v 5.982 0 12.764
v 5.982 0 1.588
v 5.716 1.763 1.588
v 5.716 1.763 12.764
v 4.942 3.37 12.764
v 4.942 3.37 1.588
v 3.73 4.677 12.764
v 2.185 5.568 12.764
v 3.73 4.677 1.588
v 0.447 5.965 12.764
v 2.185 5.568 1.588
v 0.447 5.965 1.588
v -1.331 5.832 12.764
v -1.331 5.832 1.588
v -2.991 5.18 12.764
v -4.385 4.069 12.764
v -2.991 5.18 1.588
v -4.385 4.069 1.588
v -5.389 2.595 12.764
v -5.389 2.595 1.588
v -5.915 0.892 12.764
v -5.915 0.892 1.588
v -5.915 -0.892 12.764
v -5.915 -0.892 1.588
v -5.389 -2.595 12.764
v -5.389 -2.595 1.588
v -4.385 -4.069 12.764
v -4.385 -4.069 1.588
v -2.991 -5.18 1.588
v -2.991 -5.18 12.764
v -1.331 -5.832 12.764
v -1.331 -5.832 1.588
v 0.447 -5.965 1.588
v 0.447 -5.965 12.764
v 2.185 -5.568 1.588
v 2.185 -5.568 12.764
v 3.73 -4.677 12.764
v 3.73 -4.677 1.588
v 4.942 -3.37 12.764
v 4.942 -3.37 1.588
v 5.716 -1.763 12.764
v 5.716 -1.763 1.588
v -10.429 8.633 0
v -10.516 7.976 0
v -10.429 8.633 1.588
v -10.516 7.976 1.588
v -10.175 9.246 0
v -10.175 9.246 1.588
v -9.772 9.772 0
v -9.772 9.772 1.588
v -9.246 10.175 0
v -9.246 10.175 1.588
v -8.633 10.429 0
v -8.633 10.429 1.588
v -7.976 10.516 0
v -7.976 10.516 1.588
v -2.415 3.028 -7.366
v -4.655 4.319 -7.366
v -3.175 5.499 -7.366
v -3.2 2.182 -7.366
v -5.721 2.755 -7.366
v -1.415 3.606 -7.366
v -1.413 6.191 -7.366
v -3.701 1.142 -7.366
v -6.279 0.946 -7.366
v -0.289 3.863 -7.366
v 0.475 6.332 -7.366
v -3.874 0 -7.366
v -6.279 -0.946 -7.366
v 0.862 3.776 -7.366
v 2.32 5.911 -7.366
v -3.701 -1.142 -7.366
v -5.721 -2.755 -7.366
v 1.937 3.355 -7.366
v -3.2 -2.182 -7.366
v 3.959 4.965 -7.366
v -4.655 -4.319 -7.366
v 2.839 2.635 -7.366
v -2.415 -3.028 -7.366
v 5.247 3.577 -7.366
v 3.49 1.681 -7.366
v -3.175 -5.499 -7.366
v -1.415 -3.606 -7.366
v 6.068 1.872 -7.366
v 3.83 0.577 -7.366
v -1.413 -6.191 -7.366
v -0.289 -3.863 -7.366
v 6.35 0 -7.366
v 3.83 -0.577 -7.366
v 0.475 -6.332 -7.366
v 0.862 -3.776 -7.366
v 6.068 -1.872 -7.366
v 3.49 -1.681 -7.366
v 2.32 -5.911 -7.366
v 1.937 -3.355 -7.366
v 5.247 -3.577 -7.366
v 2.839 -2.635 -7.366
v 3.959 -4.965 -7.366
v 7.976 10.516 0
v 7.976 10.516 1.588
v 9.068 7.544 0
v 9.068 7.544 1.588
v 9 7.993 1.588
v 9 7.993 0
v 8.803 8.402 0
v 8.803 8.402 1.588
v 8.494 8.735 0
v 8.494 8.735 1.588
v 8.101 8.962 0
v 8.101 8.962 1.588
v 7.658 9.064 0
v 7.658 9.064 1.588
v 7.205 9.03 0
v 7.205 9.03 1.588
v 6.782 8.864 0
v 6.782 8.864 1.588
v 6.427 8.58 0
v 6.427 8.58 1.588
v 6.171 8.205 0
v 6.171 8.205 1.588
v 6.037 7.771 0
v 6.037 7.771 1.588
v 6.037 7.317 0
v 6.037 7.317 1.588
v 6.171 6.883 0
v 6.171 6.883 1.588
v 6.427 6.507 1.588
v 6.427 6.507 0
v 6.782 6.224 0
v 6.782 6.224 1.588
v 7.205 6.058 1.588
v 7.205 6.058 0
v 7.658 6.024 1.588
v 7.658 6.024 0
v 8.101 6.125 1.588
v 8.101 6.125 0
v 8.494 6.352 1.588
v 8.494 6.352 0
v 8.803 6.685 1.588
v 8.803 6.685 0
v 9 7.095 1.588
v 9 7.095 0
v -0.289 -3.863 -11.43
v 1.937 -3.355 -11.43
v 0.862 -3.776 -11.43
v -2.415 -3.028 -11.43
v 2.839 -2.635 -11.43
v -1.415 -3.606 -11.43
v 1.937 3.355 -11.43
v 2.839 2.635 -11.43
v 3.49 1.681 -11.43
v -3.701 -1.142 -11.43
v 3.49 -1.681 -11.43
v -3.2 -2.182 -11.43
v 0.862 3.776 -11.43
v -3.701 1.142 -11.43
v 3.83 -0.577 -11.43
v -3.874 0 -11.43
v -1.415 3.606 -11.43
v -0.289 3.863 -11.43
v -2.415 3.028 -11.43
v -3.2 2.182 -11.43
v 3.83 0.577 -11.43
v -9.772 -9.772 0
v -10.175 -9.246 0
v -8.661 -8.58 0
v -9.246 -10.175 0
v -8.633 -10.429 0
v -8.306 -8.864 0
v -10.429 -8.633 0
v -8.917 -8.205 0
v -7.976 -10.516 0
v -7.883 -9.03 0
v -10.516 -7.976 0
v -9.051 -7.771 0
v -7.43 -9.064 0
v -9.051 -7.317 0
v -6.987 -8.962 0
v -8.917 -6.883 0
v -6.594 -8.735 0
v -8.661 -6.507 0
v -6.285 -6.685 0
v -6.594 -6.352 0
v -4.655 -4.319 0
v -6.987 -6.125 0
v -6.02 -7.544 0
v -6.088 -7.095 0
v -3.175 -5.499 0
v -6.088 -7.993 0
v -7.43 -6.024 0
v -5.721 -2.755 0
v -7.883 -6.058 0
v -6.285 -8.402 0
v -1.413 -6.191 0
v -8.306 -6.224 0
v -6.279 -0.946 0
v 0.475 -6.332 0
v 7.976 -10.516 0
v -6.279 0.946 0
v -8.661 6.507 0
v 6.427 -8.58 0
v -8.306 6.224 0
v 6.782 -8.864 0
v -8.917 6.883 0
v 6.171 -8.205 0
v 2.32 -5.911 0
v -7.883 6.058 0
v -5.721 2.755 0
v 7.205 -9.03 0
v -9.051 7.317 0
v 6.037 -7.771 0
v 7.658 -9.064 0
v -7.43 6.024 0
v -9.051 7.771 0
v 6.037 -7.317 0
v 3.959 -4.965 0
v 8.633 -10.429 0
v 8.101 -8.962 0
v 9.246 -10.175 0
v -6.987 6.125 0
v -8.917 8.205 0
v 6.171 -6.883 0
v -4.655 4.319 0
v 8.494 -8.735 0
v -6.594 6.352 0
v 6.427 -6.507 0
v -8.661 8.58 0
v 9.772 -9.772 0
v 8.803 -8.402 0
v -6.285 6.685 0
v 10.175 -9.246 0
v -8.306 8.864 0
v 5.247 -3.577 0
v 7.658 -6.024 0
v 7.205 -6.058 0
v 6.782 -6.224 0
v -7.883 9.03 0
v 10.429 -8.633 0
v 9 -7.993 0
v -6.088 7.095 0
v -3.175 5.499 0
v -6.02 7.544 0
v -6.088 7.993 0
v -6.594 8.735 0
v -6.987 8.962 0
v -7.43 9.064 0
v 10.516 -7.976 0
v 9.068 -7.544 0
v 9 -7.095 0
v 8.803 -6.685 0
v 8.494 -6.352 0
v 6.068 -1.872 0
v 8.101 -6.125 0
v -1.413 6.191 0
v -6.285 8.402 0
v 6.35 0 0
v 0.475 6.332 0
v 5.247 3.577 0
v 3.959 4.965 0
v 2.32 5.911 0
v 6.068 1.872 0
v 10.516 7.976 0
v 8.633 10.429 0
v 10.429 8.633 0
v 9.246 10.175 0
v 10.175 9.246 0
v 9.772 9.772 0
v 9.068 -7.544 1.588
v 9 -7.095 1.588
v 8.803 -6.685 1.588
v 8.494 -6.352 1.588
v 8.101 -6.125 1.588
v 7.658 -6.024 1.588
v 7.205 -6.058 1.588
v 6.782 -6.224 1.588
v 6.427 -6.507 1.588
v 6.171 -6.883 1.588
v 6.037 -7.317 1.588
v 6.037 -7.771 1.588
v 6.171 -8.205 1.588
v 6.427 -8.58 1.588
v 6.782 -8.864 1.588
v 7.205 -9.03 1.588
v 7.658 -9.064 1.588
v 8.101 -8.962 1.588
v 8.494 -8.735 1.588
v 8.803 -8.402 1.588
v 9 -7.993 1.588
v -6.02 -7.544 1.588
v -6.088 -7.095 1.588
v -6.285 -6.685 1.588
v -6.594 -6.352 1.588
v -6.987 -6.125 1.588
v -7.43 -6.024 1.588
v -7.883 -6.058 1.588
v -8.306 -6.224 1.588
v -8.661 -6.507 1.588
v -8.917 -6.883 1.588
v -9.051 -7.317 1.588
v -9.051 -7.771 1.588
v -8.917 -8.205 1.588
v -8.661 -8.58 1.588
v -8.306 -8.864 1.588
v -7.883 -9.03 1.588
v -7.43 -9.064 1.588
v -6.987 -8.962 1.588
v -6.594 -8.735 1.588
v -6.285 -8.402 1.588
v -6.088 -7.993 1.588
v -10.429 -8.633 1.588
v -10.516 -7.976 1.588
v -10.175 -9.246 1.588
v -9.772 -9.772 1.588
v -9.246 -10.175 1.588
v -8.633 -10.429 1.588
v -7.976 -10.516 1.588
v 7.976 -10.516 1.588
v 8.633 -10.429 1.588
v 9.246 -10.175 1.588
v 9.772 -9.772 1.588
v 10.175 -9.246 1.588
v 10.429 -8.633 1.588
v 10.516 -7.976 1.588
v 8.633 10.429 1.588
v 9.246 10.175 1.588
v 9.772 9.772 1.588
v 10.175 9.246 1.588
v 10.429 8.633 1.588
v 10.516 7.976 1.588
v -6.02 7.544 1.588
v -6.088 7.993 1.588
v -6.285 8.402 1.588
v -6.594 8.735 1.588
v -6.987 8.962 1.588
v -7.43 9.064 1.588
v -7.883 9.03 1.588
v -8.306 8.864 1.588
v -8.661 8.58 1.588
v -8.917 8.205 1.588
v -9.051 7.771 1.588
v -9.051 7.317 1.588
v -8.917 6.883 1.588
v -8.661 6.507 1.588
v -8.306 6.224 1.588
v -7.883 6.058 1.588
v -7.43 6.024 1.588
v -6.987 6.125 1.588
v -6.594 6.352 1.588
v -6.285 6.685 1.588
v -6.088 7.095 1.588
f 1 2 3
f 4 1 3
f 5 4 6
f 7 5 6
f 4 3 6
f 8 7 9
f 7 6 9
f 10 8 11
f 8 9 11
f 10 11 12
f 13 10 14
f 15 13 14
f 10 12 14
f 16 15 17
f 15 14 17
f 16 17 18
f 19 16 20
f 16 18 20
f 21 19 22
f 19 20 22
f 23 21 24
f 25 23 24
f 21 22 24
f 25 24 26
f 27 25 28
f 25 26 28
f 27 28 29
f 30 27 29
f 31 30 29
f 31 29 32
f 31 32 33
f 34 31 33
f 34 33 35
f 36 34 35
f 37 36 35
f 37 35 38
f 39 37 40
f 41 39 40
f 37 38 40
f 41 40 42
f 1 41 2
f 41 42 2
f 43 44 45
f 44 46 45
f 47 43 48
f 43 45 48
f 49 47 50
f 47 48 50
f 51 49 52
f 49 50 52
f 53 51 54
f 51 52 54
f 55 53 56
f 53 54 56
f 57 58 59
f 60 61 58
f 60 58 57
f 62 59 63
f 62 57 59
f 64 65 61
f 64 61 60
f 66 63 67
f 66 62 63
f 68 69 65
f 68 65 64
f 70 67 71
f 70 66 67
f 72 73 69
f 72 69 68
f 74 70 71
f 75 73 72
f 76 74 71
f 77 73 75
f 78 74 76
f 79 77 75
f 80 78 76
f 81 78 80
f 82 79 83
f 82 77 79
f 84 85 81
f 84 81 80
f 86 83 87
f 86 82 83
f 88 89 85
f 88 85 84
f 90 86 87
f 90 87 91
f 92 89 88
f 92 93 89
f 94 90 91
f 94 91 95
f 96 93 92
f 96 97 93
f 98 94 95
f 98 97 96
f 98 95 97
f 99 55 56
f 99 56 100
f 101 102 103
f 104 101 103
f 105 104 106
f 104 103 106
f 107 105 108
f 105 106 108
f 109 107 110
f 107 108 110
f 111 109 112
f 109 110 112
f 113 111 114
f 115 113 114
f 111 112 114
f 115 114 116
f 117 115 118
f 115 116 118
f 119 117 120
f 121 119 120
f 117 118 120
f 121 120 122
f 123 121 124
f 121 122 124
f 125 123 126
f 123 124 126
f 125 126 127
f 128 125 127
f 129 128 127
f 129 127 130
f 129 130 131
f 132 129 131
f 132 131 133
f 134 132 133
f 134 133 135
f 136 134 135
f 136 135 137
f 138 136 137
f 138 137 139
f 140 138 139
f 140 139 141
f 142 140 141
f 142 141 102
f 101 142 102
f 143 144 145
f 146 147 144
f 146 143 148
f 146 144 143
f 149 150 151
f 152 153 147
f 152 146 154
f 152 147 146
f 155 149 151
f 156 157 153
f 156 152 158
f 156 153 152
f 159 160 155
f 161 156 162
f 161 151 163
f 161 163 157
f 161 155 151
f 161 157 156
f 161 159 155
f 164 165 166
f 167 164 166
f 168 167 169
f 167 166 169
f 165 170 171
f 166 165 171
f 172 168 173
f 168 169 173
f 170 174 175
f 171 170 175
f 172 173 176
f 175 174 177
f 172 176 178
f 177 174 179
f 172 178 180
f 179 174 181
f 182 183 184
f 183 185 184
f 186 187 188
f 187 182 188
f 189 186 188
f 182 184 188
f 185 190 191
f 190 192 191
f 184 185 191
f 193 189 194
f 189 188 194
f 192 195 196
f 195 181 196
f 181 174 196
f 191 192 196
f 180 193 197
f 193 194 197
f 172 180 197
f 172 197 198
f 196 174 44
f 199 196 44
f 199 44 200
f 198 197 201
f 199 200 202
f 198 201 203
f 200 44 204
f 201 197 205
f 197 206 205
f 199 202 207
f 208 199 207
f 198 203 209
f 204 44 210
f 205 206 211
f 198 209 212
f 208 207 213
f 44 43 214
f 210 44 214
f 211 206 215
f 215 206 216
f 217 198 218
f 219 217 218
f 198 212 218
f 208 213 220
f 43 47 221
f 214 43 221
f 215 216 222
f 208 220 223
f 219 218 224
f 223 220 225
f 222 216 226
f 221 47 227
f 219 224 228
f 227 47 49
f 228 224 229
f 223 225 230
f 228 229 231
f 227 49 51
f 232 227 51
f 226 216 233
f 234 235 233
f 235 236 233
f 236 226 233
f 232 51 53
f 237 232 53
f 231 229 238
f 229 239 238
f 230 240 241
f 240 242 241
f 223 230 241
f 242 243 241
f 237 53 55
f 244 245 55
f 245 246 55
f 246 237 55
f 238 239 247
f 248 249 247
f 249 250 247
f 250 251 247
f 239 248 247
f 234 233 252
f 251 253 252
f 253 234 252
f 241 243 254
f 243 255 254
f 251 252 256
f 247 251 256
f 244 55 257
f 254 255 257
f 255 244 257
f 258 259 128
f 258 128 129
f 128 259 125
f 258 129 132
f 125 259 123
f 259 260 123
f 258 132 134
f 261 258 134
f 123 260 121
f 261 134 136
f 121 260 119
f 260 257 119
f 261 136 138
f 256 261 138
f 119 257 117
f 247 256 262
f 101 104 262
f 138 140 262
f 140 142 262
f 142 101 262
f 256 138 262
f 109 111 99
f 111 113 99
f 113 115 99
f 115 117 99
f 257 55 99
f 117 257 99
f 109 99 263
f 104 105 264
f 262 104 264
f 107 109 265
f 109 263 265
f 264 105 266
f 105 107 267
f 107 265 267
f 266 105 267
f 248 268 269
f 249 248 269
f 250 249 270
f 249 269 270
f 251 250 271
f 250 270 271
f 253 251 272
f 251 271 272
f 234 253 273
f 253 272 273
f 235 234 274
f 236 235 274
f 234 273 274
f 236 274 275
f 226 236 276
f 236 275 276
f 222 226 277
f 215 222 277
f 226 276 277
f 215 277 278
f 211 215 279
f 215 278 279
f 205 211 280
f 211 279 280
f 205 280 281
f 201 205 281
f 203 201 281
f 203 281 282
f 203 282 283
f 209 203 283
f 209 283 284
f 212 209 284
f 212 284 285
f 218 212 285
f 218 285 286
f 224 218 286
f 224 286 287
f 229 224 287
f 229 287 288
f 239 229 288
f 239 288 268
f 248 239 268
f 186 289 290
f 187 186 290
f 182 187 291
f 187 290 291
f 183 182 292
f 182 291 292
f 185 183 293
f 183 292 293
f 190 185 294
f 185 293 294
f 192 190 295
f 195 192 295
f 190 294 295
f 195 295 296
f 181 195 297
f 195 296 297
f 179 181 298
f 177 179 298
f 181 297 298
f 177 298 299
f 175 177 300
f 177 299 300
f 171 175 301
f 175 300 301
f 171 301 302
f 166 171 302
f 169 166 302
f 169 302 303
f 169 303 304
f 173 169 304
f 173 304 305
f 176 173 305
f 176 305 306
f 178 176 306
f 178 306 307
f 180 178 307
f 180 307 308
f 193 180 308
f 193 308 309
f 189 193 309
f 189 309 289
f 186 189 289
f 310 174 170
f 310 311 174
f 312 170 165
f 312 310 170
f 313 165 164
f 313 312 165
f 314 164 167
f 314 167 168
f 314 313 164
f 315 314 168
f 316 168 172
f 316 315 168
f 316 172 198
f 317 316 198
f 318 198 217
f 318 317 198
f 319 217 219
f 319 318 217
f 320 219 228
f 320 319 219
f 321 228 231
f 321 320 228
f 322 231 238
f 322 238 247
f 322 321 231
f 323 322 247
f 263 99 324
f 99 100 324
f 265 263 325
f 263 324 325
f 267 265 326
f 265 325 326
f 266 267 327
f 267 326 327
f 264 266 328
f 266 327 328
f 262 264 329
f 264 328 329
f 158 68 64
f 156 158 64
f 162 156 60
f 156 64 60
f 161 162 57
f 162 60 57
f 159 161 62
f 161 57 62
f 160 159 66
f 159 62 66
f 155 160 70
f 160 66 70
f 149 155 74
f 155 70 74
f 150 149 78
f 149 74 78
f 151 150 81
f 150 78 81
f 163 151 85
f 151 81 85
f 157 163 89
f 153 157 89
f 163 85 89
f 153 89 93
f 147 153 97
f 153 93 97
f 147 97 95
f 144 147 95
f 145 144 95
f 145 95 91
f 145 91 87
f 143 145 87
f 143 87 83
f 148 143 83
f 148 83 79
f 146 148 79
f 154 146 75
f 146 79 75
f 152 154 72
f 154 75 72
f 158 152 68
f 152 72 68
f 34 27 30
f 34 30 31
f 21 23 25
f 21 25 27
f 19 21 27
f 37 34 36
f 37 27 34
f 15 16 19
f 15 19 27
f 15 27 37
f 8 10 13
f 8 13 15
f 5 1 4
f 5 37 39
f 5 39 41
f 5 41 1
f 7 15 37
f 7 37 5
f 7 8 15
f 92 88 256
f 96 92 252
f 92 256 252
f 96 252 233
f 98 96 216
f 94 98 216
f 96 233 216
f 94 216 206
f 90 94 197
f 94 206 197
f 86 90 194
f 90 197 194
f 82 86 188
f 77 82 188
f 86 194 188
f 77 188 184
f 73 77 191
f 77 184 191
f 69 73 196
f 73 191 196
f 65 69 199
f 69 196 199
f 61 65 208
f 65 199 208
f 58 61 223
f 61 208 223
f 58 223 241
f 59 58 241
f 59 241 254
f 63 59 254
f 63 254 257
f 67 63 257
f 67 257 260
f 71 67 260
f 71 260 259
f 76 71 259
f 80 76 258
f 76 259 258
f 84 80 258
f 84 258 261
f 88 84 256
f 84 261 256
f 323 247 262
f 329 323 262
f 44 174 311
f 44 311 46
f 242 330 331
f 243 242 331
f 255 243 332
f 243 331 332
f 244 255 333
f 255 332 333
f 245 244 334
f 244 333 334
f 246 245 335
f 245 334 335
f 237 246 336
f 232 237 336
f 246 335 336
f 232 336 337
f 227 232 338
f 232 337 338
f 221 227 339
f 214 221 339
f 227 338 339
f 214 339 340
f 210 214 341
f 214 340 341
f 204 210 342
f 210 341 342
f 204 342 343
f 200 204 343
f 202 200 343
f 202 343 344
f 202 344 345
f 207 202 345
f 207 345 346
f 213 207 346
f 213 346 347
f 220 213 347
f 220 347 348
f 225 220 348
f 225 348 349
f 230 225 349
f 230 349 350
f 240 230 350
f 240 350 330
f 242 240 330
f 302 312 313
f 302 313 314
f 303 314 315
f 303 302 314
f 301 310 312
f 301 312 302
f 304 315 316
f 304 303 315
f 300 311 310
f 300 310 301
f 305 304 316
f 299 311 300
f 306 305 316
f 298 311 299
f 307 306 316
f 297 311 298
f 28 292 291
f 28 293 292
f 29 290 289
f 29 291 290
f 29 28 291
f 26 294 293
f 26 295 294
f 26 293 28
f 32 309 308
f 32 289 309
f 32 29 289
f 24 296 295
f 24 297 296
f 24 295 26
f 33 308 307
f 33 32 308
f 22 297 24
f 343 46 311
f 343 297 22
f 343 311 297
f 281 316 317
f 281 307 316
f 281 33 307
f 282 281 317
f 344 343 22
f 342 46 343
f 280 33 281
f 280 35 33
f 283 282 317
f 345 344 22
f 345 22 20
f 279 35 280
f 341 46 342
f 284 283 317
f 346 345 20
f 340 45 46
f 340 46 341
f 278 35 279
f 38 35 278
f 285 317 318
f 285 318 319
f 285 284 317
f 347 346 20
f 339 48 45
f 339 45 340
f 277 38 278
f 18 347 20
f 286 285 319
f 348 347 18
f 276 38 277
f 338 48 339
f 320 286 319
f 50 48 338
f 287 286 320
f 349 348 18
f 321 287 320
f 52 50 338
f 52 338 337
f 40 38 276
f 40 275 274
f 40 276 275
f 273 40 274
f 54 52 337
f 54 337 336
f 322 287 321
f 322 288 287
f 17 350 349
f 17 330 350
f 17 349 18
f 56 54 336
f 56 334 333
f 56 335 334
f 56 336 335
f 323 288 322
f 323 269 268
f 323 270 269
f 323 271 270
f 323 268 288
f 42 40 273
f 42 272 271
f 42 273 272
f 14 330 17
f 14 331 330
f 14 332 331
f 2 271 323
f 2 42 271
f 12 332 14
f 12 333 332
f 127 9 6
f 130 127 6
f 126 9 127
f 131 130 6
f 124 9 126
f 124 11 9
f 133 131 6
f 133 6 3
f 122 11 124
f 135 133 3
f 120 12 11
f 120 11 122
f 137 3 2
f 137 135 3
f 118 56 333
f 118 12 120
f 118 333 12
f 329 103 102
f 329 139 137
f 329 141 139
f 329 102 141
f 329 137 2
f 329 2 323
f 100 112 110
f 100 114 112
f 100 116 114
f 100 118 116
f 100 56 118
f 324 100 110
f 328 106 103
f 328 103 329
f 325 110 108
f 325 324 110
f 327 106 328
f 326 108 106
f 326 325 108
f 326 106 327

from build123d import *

# Parameters (mm, degrees)
SKETCH1_W           = 21.0312
SKETCH1_H           = 21.0312
BOSS_EXTRUDE1_DEPTH = 1.5875
SKETCH2_R           = 1.524
CUT_EXTRUDE1_DEPTH  = 15.9557963
FILLET1_R           = 2.54
SKETCH3_R           = 5.9817
BOSS_EXTRUDE2_DEPTH = 11.176
SKETCH4_R           = 6.35
BOSS_EXTRUDE3_DEPTH = 7.366
SKETCH5_R           = 3.8735
BOSS_EXTRUDE4_DEPTH = 4.064


with BuildPart() as part:
    # Sketch1 → Boss-Extrude1 (new body)
    with BuildSketch(Plane.XY):
        Rectangle(SKETCH1_W, SKETCH1_H)
    extrude(amount=BOSS_EXTRUDE1_DEPTH)

    # Sketch2 → Cut-Extrude1 (cut, through all)
    with BuildSketch(Plane.XY.offset(1.5875)):
        with Locations((-7.5438, 7.5438)):
            Circle(SKETCH2_R)
        with Locations((-7.5438, -7.5438)):
            Circle(SKETCH2_R)
        with Locations((7.5438, -7.5438)):
            Circle(SKETCH2_R)
        with Locations((7.5438, 7.5438)):
            Circle(SKETCH2_R)
    extrude(amount=-CUT_EXTRUDE1_DEPTH, mode=Mode.SUBTRACT)

    # Fillet1
    fillet1_edges = [part.edges().sort_by_distance(p)[0] for p in [
        (10.5156, -10.5156, 0.79375),
        (-10.5156, -10.5156, 0.79375),
        (-10.5156, 10.5156, 0.79375),
        (10.5156, 10.5156, 0.79375),
    ]]
    fillet(fillet1_edges, radius=FILLET1_R)

    # Sketch3 → Boss-Extrude2 (add)
    with BuildSketch(Plane.XY.offset(1.5875)):
        Circle(SKETCH3_R)
    extrude(amount=BOSS_EXTRUDE2_DEPTH)

    # Sketch4 → Boss-Extrude3 (add)
    with BuildSketch(Plane(origin=(0, 0, 0), x_dir=(-1, 0, 0), z_dir=(0, 0, -1))):
        with Locations(Location((0, 0, 0), (0, 0, 180))):
            Circle(SKETCH4_R)
    extrude(amount=BOSS_EXTRUDE3_DEPTH)

    # Sketch5 → Boss-Extrude4 (add)
    with BuildSketch(Plane(origin=(0, 0, -7.366), x_dir=(-1, 0, 0), z_dir=(0, 0, -1))):
        Circle(SKETCH5_R)
    extrude(amount=BOSS_EXTRUDE4_DEPTH)


solid = part.part
